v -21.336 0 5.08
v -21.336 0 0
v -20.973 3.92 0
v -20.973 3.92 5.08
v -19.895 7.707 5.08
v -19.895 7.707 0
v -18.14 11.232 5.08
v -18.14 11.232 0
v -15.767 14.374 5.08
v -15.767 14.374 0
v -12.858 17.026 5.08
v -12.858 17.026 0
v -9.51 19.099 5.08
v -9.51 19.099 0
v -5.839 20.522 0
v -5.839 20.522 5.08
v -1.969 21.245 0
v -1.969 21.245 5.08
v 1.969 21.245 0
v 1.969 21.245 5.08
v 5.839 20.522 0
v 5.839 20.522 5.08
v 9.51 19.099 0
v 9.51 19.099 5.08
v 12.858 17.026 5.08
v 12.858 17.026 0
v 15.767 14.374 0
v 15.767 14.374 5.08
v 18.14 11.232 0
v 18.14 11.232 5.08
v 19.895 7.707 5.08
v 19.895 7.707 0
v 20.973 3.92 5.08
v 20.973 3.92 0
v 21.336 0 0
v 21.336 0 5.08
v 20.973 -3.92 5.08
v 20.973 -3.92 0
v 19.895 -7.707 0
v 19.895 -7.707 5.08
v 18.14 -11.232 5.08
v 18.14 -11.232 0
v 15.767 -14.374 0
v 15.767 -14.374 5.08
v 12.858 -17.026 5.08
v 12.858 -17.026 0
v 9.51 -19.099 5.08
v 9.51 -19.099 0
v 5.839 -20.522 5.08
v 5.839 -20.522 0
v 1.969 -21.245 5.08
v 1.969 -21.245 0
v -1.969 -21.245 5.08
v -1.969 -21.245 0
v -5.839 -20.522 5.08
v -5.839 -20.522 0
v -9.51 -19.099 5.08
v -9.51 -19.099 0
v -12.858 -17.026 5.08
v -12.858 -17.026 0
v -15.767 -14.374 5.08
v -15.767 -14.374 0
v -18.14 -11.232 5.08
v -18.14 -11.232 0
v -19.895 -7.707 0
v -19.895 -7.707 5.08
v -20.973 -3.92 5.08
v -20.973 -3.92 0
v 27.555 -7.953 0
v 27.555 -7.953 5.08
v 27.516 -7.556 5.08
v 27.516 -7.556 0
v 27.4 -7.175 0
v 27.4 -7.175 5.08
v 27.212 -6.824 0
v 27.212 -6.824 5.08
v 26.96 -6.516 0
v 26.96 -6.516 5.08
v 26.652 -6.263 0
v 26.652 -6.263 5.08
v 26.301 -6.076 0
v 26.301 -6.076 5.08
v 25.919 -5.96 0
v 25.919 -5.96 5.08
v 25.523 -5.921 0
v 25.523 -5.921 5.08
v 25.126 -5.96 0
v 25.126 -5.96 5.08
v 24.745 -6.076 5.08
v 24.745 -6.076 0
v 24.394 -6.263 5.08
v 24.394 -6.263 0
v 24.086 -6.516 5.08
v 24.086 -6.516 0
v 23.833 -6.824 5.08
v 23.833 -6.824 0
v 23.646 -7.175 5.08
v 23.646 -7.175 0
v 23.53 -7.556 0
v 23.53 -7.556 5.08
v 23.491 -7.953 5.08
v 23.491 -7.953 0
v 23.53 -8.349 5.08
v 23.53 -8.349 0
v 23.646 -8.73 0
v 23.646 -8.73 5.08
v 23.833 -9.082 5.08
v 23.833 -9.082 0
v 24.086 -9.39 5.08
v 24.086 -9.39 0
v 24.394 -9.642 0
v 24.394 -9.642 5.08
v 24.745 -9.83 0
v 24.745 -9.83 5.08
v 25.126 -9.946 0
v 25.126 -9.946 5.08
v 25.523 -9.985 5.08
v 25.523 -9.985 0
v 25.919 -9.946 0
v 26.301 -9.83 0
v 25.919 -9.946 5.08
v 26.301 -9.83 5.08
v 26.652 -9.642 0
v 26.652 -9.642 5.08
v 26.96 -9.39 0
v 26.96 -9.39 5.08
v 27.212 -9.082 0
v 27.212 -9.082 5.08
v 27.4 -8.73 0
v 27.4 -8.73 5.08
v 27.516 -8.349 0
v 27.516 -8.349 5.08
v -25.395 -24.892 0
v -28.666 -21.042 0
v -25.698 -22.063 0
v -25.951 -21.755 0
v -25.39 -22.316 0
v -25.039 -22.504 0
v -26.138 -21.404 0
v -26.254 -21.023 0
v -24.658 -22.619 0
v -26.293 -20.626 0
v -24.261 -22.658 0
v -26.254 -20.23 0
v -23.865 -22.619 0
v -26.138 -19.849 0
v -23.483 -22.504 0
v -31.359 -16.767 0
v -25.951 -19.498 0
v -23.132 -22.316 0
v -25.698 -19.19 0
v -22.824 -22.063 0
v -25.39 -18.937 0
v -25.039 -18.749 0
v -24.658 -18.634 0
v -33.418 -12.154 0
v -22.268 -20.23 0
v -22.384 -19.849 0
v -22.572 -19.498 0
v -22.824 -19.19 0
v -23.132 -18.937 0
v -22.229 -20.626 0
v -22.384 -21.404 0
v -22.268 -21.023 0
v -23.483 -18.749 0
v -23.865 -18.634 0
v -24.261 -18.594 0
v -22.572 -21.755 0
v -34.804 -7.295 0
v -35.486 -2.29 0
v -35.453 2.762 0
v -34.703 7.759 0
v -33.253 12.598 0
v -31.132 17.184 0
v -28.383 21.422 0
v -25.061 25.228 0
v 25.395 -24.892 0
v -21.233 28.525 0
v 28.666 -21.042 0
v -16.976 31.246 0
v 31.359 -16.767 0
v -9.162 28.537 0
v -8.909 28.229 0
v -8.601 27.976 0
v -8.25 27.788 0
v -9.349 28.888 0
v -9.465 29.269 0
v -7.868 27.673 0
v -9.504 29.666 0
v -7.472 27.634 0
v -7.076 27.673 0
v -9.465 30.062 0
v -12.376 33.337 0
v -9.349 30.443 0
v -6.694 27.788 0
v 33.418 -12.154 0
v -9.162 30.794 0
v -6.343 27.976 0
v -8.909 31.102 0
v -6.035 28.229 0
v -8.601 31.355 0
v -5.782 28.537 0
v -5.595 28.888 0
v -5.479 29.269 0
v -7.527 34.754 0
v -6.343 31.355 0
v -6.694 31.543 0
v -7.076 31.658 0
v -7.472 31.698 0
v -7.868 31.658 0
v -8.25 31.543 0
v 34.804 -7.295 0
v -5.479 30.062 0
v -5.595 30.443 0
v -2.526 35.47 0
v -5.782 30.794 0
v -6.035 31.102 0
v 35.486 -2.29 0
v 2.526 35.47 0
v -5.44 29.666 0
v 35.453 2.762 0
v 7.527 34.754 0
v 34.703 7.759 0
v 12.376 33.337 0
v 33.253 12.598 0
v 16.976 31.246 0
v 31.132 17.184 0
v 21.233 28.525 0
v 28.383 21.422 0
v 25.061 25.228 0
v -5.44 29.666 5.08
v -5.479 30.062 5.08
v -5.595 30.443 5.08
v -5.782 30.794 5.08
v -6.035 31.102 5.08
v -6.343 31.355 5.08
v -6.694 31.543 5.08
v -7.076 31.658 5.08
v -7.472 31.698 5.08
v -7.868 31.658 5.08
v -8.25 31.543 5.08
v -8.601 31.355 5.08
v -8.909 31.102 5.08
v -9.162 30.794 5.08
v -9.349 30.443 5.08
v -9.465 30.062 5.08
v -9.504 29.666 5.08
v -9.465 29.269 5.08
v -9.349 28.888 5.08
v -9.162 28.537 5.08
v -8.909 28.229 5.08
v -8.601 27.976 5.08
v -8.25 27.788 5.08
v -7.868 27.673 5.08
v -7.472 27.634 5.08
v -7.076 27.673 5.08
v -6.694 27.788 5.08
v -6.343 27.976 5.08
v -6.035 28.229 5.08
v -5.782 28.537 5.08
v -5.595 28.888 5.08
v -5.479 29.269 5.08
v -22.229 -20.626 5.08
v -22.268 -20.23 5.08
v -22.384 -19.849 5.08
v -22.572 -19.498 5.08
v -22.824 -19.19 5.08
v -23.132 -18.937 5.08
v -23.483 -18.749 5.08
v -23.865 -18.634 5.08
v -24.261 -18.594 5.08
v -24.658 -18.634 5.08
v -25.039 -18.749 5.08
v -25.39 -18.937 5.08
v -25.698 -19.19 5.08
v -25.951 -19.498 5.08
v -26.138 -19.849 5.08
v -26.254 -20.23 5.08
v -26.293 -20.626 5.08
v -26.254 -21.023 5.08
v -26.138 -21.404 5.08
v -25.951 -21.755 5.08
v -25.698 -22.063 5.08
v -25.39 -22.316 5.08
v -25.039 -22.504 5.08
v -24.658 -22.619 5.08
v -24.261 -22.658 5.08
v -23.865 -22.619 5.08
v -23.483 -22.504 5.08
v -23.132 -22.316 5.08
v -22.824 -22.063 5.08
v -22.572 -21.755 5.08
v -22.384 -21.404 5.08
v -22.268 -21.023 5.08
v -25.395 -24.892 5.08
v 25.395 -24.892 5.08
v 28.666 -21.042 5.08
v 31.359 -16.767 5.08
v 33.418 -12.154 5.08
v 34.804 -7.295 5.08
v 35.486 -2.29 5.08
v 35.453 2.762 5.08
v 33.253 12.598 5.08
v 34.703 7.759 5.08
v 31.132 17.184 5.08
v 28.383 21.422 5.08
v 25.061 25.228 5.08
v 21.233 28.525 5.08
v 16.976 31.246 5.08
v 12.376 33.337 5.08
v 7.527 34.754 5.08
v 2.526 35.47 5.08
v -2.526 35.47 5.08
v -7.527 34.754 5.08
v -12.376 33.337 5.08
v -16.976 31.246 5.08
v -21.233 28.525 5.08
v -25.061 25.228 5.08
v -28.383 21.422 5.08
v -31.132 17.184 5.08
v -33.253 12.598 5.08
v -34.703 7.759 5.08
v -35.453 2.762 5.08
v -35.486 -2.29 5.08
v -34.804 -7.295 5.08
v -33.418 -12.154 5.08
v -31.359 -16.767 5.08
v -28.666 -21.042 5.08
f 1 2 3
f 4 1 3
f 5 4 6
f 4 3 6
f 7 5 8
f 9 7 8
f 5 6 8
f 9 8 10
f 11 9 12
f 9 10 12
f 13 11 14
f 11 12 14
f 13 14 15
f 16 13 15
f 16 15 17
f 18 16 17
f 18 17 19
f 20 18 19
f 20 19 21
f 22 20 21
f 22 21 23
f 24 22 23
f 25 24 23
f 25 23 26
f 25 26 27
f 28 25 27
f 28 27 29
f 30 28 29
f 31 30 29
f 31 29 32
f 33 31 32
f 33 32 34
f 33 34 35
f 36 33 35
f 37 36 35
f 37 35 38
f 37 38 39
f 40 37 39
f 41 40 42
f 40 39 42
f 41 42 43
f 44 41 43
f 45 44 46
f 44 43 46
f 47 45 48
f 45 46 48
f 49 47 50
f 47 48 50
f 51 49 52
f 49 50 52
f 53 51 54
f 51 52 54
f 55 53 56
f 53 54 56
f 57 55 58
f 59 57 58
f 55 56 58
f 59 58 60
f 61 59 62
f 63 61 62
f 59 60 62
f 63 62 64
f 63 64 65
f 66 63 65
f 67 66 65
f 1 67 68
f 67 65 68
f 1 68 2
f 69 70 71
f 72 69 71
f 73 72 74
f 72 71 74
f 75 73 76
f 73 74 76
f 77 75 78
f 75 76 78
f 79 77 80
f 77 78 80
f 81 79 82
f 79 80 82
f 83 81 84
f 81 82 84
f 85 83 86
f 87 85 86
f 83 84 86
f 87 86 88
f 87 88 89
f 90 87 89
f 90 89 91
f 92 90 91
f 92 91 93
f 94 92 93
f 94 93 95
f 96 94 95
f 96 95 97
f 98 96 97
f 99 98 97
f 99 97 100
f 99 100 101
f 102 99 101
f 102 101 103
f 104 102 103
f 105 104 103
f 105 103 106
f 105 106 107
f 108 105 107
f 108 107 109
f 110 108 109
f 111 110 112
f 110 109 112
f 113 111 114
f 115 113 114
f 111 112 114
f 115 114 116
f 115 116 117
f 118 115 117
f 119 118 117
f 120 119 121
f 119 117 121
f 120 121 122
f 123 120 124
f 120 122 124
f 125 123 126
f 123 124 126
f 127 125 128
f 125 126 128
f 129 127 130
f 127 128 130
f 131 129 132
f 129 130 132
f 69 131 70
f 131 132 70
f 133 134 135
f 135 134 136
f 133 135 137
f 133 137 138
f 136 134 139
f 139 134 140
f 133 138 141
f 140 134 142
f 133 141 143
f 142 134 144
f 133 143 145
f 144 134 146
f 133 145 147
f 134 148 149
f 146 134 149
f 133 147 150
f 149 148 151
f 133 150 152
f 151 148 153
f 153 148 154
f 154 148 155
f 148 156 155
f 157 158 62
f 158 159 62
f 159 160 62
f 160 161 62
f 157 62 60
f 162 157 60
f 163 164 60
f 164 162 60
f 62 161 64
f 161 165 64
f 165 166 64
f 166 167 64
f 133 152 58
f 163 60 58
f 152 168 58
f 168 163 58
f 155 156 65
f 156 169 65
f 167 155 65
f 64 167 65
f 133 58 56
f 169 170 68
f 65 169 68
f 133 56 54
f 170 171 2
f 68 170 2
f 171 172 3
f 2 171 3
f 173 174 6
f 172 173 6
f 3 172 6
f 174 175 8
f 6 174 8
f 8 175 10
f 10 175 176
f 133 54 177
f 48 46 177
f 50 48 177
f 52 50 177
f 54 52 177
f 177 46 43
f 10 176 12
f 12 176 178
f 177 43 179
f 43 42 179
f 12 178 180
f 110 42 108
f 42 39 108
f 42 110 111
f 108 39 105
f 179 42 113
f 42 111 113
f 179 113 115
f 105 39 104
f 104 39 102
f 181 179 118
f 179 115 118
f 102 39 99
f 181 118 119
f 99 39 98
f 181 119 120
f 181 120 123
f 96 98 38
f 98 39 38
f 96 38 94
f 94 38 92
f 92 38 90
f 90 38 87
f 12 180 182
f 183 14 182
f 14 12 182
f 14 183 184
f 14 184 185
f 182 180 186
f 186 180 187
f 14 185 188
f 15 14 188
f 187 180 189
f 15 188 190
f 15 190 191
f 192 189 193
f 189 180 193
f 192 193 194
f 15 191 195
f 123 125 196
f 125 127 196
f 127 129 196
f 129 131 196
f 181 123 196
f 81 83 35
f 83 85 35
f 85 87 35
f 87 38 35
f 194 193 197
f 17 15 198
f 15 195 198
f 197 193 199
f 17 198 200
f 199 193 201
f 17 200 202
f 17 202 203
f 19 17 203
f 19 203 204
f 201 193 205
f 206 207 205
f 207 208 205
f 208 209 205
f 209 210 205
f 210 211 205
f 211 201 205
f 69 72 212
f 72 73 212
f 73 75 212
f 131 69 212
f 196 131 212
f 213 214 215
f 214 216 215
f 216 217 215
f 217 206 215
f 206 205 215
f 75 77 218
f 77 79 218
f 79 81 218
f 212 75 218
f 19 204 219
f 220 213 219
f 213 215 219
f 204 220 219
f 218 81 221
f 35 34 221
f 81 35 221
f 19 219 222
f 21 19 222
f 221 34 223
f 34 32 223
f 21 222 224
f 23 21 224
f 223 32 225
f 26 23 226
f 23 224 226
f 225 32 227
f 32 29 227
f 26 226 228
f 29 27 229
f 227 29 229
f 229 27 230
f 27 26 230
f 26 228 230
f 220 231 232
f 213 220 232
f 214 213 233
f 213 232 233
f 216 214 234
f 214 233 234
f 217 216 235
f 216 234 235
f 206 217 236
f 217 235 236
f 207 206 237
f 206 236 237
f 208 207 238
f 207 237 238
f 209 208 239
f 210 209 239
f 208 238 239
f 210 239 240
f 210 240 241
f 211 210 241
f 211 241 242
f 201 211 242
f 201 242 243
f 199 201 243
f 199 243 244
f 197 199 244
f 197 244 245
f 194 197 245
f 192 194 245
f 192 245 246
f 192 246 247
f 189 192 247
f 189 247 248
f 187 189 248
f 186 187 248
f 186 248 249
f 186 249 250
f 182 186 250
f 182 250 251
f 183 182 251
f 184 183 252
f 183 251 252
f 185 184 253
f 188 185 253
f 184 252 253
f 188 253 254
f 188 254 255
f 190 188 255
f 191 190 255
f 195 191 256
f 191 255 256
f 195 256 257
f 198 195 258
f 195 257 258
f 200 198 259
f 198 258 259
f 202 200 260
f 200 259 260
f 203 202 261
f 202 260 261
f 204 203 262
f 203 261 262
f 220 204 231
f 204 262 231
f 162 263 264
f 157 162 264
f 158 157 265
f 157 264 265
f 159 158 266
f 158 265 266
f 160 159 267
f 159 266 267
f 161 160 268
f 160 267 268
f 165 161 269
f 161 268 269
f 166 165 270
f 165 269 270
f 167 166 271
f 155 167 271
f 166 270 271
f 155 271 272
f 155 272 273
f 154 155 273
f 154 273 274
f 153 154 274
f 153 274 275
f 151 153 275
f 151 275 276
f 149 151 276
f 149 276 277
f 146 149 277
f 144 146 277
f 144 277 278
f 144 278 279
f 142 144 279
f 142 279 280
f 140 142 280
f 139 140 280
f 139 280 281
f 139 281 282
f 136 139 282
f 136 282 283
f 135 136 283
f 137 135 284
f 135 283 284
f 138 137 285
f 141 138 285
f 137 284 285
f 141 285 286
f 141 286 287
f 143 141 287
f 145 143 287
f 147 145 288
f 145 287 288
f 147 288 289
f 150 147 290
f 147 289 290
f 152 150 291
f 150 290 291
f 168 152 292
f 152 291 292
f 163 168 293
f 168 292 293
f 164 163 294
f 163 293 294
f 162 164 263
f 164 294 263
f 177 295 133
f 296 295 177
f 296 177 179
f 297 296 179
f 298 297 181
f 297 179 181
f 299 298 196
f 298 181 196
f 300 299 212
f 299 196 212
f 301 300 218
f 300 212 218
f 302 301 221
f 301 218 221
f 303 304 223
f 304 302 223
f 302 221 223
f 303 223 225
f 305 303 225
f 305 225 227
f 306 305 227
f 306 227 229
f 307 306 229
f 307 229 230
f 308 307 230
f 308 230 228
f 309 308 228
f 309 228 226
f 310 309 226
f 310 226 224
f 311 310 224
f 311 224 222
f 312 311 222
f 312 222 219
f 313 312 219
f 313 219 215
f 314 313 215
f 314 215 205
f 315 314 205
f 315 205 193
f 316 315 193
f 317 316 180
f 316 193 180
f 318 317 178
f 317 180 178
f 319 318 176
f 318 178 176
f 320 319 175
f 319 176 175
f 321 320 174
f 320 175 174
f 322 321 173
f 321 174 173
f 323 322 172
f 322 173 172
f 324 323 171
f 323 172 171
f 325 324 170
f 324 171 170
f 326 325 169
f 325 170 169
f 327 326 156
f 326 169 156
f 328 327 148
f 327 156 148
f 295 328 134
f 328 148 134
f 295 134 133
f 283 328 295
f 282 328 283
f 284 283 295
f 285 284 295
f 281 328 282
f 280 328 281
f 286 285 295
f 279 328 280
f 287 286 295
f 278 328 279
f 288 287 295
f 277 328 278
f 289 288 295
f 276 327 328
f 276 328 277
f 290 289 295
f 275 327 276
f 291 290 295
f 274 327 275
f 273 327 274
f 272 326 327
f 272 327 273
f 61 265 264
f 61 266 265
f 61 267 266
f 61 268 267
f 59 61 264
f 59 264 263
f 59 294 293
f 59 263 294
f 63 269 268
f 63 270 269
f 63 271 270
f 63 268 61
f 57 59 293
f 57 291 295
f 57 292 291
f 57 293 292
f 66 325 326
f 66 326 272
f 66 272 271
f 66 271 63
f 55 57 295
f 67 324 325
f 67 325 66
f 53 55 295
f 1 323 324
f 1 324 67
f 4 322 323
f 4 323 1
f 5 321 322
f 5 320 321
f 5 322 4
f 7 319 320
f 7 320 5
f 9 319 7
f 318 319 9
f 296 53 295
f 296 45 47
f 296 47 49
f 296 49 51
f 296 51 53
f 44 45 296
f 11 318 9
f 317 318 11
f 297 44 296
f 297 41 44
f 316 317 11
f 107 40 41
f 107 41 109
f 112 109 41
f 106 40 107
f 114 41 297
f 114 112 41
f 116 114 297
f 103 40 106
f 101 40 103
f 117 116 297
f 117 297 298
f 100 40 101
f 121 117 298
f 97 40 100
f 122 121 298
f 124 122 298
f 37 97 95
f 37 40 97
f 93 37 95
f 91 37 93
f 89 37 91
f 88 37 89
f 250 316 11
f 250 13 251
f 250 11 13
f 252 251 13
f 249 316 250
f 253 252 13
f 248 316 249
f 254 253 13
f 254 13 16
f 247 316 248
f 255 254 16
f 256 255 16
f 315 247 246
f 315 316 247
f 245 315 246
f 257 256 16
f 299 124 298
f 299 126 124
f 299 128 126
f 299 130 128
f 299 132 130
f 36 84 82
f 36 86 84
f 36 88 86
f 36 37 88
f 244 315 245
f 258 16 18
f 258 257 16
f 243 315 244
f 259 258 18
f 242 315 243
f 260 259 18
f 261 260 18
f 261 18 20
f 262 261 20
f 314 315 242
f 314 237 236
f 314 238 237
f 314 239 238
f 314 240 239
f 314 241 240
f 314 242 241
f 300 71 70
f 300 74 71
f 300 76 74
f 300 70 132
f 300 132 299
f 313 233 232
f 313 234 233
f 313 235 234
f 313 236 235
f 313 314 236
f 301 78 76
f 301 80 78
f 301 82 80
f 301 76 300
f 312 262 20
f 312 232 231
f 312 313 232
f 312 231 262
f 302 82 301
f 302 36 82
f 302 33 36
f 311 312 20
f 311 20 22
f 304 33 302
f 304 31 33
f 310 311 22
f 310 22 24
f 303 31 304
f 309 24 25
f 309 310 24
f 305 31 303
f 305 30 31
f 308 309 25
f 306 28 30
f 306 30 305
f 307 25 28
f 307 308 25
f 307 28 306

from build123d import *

# Parameters (mm, degrees)
SKETCH1_R           = 35.56
BOSS_EXTRUDE1_DEPTH = 5.08
CUT_EXTRUDE1_DEPTH  = 51.545361805
SKETCH7_R           = 2.032
CUT_EXTRUDE2_DEPTH  = 51.545361805
SKETCH8_R           = 21.336
CUT_EXTRUDE3_DEPTH  = 51.545361805


with BuildPart() as part:
    # Sketch1 → Boss-Extrude1 (new body)
    with BuildSketch(Plane.XY):
        Circle(SKETCH1_R)
    extrude(amount=BOSS_EXTRUDE1_DEPTH)

    # Sketch2 → Cut-Extrude1 (cut, through all)
    with BuildSketch(Plane.XY.offset(5.08)):
        Polygon((0, -35.56), (-36.256055522, -35.56), (-36.256055522, -24.892), (33.75035888, -24.892), (33.75035888, -35.56), align=None)
    extrude(amount=-CUT_EXTRUDE1_DEPTH, mode=Mode.SUBTRACT)

    # Sketch7 → Cut-Extrude2 (cut, through all)
    with BuildSketch(Plane.XY.offset(5.08)):
        with Locations((-24.261099887, -20.626476503)):
            Circle(SKETCH7_R)
        with Locations((-7.471969114, 29.665523497)):
            Circle(SKETCH7_R)
        with Locations((25.522900113, -7.952823738)):
            Circle(SKETCH7_R)
    extrude(amount=-CUT_EXTRUDE2_DEPTH, mode=Mode.SUBTRACT)

    # Sketch8 → Cut-Extrude3 (cut, through all)
    with BuildSketch(Plane(origin=(0, 0, 0), x_dir=(-1, 0, 0), z_dir=(0, 0, -1))):
        Circle(SKETCH8_R)
    extrude(amount=-CUT_EXTRUDE3_DEPTH, mode=Mode.SUBTRACT)


solid = part.part
